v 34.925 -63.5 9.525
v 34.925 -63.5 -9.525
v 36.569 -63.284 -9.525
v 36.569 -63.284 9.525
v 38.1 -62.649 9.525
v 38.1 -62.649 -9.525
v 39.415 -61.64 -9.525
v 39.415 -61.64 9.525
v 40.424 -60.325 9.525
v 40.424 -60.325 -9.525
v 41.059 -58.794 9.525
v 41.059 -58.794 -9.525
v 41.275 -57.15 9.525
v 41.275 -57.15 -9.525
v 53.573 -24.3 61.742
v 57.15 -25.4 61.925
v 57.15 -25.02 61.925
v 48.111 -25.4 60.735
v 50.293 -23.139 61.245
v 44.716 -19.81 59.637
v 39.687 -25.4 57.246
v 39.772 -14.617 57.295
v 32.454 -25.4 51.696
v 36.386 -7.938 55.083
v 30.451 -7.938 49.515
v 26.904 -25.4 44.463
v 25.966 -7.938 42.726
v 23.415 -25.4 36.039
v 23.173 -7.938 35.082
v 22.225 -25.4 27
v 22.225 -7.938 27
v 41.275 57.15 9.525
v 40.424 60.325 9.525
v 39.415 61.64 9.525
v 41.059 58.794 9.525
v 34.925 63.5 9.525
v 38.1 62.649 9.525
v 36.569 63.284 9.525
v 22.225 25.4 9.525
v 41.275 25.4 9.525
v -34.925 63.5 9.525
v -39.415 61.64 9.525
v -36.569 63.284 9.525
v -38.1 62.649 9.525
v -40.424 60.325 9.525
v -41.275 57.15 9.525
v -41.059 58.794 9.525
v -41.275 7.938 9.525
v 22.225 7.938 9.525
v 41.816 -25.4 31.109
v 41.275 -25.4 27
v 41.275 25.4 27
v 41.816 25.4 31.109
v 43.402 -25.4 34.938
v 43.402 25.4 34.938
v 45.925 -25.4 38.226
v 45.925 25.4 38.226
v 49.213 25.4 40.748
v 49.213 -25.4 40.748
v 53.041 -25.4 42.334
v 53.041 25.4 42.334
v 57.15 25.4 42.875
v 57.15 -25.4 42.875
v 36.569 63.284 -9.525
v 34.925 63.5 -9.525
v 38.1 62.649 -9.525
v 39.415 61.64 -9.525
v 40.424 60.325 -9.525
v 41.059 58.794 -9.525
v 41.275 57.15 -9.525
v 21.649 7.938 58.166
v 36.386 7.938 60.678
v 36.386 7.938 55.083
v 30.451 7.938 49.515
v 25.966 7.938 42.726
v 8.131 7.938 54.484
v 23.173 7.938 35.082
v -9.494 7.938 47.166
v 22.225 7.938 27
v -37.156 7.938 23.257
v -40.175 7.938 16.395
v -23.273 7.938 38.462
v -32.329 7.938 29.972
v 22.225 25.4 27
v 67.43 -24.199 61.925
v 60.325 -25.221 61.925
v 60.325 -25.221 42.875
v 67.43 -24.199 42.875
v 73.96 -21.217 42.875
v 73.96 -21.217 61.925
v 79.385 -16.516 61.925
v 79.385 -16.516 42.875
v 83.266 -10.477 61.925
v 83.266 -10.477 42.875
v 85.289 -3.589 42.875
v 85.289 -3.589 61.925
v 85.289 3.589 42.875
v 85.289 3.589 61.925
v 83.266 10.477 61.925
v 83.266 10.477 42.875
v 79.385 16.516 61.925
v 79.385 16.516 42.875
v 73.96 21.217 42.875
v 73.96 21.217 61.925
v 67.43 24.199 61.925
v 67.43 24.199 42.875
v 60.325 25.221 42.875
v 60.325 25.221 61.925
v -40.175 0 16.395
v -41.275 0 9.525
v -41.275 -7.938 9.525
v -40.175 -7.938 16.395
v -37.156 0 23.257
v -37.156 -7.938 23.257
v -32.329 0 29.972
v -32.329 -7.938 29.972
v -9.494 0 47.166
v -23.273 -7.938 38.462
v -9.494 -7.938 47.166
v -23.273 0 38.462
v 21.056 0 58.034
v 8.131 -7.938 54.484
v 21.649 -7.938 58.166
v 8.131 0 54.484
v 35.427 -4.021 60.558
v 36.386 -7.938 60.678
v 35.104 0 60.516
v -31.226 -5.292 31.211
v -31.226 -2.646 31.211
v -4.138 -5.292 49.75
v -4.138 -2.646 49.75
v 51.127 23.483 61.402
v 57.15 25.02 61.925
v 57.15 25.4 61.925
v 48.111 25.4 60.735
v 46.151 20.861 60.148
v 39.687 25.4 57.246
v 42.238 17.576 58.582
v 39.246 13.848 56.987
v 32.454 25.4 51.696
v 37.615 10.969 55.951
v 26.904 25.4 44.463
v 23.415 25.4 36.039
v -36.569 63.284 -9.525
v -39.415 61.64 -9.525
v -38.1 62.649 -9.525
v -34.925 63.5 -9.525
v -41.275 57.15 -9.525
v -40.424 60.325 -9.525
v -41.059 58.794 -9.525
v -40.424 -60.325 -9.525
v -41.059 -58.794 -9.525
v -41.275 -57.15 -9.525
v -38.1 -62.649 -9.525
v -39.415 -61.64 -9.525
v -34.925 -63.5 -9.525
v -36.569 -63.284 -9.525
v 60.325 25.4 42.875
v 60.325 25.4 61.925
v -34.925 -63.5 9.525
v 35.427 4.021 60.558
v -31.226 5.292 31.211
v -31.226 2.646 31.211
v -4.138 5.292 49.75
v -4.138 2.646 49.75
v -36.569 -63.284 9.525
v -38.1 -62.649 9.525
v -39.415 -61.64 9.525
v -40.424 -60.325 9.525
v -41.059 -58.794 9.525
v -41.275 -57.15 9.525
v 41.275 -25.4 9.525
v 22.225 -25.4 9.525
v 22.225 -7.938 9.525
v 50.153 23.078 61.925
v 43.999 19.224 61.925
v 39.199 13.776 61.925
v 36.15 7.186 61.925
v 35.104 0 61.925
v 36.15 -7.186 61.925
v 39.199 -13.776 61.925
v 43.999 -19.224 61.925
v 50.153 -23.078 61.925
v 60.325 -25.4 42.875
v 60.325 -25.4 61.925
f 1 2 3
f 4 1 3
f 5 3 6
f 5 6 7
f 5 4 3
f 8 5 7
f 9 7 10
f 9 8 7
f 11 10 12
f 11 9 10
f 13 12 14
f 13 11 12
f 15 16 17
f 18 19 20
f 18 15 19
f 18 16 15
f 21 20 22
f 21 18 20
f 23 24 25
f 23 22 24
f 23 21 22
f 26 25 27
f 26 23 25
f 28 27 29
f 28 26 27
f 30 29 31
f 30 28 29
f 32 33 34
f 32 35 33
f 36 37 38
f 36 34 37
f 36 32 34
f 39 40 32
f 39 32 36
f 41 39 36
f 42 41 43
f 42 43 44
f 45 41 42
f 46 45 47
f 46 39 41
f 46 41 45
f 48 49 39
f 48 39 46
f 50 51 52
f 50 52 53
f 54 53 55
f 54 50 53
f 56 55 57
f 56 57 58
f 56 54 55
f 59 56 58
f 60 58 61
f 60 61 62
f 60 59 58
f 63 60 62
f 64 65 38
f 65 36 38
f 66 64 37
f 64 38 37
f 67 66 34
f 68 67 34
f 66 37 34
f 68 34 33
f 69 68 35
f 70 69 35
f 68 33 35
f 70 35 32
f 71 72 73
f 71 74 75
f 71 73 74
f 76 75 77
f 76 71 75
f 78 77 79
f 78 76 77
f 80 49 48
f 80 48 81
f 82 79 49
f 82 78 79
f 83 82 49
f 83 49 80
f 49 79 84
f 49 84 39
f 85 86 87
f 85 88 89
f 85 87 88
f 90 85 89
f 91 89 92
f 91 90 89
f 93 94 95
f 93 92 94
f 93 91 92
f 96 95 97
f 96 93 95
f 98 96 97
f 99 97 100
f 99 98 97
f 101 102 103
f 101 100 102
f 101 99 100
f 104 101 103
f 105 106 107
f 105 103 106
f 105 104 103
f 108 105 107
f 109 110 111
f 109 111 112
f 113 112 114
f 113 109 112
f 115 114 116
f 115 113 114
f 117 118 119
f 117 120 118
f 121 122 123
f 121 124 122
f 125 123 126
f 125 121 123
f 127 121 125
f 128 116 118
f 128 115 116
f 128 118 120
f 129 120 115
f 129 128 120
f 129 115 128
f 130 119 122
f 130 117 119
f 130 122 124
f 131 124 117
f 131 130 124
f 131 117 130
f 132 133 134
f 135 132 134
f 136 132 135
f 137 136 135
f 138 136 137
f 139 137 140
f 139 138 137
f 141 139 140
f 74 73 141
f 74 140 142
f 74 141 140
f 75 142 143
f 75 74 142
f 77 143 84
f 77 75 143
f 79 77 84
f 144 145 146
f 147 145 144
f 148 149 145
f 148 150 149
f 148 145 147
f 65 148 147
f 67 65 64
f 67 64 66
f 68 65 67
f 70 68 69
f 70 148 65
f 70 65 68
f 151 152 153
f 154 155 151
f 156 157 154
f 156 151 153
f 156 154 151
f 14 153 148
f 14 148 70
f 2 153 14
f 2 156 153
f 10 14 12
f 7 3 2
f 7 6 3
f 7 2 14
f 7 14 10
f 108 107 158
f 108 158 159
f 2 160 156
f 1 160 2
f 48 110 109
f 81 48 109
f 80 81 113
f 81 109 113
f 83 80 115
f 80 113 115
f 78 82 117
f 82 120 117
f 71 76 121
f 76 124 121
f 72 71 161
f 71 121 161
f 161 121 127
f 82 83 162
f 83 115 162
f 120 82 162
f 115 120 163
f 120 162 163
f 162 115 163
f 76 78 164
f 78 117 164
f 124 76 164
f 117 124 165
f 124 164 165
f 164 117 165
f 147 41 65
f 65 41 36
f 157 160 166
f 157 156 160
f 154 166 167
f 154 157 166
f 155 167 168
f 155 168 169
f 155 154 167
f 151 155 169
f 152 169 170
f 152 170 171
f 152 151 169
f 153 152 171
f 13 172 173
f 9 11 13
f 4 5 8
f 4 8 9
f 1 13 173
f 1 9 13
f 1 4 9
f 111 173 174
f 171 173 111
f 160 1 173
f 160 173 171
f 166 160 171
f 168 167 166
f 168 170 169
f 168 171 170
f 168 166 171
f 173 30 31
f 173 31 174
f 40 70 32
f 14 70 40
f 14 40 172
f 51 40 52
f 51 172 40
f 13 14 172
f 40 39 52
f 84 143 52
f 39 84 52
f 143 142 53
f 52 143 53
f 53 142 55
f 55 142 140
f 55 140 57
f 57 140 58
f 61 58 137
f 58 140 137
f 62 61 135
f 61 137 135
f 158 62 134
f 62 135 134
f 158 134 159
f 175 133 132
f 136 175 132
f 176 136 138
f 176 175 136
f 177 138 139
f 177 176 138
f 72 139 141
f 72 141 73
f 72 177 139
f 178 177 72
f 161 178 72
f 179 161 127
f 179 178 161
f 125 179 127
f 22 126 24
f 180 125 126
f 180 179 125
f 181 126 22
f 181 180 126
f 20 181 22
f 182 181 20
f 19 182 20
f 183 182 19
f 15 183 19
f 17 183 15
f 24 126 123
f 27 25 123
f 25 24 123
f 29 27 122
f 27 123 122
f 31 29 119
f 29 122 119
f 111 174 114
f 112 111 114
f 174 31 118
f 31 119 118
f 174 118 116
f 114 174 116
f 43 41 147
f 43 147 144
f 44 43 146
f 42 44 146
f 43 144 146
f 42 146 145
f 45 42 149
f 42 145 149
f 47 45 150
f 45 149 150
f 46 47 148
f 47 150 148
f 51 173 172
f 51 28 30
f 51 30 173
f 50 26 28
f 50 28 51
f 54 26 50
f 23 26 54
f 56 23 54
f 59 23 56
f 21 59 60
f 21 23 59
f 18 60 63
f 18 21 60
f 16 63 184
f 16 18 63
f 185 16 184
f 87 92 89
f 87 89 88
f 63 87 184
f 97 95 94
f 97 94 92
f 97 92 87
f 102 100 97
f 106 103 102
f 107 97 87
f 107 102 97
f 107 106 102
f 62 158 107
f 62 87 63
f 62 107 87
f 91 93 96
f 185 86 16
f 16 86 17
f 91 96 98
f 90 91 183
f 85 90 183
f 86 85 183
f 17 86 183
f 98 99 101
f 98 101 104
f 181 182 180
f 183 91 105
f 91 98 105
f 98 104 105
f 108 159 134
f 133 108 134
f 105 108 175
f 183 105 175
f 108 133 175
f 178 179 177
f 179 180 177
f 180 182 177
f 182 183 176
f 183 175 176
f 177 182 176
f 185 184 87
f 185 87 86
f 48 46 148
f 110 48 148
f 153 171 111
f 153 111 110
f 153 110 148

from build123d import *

# Parameters (mm, degrees)
F1_DEPTH = 63.5
F2_DEPTH = 25.4
F3_DEPTH = 7.9375
F0_W     = 25.2205249548
F0_H     = 19.0500000358
F5_R     = 6.35


with BuildPart() as f1:
    # F0 (on Front) → F1 (new body, symmetric)
    with BuildSketch(Plane.XZ):
        Polygon((-41.275, -9.525), (41.275, -9.525), (41.275, 9.525), (22.2249999642, 9.525), (-41.275, 9.525), align=None)
    extrude(amount=F1_DEPTH, both=True)

    # F0 (on Front) → F2 (join, symmetric)
    with BuildSketch(Plane.XZ):
        with BuildLine():
            Line((22.2249999642, 9.525), (41.275, 9.525))
            Line((41.275, 9.525), (41.275, 27.0002))
            ThreePointArc((41.275, 27.0002), (45.9246798487, 38.2255201513), (57.15, 42.8752))
            Line((57.15, 42.8752), (60.325, 42.8752))
            Line((60.325, 42.8752), (60.325, 61.9252000358))
            Line((60.325, 61.9252000358), (57.15, 61.9252000358))
            ThreePointArc((57.15, 61.9252000358), (32.4542956418, 51.6959043582), (22.2249999642, 27.0002))
            Line((22.2249999642, 27.0002), (22.2249999642, 9.525))
        make_face()
    extrude(amount=F2_DEPTH, both=True)

    # F0 (on Front) → F3 (join, symmetric)
    with BuildSketch(Plane.XZ):
        with BuildLine():
            add(Edge.make_bspline(
                [(-41.275, 9.525), (-40.8977142173, 34.432549157), (0, 61.9252000358), (57.15, 61.9252000358)],
                knots=[0, 0, 0, 0, 111.5045361803, 111.5045361803, 111.5045361803, 111.5045361803], degree=3))
            Line((-41.275, 9.525), (22.2249999642, 9.525))
            Line((22.2249999642, 9.525), (22.2249999642, 27.0002))
            ThreePointArc((22.2249999642, 27.0002), (32.4542956418, 51.6959043582), (57.15, 61.9252000358))
        make_face()
    extrude(amount=F3_DEPTH, both=True)

    # F0 (on Front) → F4 (revolve)
    with BuildSketch(Plane.XZ):
        with Locations((72.9352624774, 52.4002000179)):
            Rectangle(F0_W, F0_H)
    revolve(axis=Axis((60.325, 0, 52.3875), (0, 0, 1)))

    # F5
    f5_edges = [f1.edges().sort_by_distance(p)[0] for p in [
        (41.275, -63.5, 0),
        (-41.275, -63.5, 0),
        (41.275, 63.5, 0),
        (-41.275, 63.5, 0),
    ]]
    fillet(f5_edges, radius=F5_R)


solid = f1.part
